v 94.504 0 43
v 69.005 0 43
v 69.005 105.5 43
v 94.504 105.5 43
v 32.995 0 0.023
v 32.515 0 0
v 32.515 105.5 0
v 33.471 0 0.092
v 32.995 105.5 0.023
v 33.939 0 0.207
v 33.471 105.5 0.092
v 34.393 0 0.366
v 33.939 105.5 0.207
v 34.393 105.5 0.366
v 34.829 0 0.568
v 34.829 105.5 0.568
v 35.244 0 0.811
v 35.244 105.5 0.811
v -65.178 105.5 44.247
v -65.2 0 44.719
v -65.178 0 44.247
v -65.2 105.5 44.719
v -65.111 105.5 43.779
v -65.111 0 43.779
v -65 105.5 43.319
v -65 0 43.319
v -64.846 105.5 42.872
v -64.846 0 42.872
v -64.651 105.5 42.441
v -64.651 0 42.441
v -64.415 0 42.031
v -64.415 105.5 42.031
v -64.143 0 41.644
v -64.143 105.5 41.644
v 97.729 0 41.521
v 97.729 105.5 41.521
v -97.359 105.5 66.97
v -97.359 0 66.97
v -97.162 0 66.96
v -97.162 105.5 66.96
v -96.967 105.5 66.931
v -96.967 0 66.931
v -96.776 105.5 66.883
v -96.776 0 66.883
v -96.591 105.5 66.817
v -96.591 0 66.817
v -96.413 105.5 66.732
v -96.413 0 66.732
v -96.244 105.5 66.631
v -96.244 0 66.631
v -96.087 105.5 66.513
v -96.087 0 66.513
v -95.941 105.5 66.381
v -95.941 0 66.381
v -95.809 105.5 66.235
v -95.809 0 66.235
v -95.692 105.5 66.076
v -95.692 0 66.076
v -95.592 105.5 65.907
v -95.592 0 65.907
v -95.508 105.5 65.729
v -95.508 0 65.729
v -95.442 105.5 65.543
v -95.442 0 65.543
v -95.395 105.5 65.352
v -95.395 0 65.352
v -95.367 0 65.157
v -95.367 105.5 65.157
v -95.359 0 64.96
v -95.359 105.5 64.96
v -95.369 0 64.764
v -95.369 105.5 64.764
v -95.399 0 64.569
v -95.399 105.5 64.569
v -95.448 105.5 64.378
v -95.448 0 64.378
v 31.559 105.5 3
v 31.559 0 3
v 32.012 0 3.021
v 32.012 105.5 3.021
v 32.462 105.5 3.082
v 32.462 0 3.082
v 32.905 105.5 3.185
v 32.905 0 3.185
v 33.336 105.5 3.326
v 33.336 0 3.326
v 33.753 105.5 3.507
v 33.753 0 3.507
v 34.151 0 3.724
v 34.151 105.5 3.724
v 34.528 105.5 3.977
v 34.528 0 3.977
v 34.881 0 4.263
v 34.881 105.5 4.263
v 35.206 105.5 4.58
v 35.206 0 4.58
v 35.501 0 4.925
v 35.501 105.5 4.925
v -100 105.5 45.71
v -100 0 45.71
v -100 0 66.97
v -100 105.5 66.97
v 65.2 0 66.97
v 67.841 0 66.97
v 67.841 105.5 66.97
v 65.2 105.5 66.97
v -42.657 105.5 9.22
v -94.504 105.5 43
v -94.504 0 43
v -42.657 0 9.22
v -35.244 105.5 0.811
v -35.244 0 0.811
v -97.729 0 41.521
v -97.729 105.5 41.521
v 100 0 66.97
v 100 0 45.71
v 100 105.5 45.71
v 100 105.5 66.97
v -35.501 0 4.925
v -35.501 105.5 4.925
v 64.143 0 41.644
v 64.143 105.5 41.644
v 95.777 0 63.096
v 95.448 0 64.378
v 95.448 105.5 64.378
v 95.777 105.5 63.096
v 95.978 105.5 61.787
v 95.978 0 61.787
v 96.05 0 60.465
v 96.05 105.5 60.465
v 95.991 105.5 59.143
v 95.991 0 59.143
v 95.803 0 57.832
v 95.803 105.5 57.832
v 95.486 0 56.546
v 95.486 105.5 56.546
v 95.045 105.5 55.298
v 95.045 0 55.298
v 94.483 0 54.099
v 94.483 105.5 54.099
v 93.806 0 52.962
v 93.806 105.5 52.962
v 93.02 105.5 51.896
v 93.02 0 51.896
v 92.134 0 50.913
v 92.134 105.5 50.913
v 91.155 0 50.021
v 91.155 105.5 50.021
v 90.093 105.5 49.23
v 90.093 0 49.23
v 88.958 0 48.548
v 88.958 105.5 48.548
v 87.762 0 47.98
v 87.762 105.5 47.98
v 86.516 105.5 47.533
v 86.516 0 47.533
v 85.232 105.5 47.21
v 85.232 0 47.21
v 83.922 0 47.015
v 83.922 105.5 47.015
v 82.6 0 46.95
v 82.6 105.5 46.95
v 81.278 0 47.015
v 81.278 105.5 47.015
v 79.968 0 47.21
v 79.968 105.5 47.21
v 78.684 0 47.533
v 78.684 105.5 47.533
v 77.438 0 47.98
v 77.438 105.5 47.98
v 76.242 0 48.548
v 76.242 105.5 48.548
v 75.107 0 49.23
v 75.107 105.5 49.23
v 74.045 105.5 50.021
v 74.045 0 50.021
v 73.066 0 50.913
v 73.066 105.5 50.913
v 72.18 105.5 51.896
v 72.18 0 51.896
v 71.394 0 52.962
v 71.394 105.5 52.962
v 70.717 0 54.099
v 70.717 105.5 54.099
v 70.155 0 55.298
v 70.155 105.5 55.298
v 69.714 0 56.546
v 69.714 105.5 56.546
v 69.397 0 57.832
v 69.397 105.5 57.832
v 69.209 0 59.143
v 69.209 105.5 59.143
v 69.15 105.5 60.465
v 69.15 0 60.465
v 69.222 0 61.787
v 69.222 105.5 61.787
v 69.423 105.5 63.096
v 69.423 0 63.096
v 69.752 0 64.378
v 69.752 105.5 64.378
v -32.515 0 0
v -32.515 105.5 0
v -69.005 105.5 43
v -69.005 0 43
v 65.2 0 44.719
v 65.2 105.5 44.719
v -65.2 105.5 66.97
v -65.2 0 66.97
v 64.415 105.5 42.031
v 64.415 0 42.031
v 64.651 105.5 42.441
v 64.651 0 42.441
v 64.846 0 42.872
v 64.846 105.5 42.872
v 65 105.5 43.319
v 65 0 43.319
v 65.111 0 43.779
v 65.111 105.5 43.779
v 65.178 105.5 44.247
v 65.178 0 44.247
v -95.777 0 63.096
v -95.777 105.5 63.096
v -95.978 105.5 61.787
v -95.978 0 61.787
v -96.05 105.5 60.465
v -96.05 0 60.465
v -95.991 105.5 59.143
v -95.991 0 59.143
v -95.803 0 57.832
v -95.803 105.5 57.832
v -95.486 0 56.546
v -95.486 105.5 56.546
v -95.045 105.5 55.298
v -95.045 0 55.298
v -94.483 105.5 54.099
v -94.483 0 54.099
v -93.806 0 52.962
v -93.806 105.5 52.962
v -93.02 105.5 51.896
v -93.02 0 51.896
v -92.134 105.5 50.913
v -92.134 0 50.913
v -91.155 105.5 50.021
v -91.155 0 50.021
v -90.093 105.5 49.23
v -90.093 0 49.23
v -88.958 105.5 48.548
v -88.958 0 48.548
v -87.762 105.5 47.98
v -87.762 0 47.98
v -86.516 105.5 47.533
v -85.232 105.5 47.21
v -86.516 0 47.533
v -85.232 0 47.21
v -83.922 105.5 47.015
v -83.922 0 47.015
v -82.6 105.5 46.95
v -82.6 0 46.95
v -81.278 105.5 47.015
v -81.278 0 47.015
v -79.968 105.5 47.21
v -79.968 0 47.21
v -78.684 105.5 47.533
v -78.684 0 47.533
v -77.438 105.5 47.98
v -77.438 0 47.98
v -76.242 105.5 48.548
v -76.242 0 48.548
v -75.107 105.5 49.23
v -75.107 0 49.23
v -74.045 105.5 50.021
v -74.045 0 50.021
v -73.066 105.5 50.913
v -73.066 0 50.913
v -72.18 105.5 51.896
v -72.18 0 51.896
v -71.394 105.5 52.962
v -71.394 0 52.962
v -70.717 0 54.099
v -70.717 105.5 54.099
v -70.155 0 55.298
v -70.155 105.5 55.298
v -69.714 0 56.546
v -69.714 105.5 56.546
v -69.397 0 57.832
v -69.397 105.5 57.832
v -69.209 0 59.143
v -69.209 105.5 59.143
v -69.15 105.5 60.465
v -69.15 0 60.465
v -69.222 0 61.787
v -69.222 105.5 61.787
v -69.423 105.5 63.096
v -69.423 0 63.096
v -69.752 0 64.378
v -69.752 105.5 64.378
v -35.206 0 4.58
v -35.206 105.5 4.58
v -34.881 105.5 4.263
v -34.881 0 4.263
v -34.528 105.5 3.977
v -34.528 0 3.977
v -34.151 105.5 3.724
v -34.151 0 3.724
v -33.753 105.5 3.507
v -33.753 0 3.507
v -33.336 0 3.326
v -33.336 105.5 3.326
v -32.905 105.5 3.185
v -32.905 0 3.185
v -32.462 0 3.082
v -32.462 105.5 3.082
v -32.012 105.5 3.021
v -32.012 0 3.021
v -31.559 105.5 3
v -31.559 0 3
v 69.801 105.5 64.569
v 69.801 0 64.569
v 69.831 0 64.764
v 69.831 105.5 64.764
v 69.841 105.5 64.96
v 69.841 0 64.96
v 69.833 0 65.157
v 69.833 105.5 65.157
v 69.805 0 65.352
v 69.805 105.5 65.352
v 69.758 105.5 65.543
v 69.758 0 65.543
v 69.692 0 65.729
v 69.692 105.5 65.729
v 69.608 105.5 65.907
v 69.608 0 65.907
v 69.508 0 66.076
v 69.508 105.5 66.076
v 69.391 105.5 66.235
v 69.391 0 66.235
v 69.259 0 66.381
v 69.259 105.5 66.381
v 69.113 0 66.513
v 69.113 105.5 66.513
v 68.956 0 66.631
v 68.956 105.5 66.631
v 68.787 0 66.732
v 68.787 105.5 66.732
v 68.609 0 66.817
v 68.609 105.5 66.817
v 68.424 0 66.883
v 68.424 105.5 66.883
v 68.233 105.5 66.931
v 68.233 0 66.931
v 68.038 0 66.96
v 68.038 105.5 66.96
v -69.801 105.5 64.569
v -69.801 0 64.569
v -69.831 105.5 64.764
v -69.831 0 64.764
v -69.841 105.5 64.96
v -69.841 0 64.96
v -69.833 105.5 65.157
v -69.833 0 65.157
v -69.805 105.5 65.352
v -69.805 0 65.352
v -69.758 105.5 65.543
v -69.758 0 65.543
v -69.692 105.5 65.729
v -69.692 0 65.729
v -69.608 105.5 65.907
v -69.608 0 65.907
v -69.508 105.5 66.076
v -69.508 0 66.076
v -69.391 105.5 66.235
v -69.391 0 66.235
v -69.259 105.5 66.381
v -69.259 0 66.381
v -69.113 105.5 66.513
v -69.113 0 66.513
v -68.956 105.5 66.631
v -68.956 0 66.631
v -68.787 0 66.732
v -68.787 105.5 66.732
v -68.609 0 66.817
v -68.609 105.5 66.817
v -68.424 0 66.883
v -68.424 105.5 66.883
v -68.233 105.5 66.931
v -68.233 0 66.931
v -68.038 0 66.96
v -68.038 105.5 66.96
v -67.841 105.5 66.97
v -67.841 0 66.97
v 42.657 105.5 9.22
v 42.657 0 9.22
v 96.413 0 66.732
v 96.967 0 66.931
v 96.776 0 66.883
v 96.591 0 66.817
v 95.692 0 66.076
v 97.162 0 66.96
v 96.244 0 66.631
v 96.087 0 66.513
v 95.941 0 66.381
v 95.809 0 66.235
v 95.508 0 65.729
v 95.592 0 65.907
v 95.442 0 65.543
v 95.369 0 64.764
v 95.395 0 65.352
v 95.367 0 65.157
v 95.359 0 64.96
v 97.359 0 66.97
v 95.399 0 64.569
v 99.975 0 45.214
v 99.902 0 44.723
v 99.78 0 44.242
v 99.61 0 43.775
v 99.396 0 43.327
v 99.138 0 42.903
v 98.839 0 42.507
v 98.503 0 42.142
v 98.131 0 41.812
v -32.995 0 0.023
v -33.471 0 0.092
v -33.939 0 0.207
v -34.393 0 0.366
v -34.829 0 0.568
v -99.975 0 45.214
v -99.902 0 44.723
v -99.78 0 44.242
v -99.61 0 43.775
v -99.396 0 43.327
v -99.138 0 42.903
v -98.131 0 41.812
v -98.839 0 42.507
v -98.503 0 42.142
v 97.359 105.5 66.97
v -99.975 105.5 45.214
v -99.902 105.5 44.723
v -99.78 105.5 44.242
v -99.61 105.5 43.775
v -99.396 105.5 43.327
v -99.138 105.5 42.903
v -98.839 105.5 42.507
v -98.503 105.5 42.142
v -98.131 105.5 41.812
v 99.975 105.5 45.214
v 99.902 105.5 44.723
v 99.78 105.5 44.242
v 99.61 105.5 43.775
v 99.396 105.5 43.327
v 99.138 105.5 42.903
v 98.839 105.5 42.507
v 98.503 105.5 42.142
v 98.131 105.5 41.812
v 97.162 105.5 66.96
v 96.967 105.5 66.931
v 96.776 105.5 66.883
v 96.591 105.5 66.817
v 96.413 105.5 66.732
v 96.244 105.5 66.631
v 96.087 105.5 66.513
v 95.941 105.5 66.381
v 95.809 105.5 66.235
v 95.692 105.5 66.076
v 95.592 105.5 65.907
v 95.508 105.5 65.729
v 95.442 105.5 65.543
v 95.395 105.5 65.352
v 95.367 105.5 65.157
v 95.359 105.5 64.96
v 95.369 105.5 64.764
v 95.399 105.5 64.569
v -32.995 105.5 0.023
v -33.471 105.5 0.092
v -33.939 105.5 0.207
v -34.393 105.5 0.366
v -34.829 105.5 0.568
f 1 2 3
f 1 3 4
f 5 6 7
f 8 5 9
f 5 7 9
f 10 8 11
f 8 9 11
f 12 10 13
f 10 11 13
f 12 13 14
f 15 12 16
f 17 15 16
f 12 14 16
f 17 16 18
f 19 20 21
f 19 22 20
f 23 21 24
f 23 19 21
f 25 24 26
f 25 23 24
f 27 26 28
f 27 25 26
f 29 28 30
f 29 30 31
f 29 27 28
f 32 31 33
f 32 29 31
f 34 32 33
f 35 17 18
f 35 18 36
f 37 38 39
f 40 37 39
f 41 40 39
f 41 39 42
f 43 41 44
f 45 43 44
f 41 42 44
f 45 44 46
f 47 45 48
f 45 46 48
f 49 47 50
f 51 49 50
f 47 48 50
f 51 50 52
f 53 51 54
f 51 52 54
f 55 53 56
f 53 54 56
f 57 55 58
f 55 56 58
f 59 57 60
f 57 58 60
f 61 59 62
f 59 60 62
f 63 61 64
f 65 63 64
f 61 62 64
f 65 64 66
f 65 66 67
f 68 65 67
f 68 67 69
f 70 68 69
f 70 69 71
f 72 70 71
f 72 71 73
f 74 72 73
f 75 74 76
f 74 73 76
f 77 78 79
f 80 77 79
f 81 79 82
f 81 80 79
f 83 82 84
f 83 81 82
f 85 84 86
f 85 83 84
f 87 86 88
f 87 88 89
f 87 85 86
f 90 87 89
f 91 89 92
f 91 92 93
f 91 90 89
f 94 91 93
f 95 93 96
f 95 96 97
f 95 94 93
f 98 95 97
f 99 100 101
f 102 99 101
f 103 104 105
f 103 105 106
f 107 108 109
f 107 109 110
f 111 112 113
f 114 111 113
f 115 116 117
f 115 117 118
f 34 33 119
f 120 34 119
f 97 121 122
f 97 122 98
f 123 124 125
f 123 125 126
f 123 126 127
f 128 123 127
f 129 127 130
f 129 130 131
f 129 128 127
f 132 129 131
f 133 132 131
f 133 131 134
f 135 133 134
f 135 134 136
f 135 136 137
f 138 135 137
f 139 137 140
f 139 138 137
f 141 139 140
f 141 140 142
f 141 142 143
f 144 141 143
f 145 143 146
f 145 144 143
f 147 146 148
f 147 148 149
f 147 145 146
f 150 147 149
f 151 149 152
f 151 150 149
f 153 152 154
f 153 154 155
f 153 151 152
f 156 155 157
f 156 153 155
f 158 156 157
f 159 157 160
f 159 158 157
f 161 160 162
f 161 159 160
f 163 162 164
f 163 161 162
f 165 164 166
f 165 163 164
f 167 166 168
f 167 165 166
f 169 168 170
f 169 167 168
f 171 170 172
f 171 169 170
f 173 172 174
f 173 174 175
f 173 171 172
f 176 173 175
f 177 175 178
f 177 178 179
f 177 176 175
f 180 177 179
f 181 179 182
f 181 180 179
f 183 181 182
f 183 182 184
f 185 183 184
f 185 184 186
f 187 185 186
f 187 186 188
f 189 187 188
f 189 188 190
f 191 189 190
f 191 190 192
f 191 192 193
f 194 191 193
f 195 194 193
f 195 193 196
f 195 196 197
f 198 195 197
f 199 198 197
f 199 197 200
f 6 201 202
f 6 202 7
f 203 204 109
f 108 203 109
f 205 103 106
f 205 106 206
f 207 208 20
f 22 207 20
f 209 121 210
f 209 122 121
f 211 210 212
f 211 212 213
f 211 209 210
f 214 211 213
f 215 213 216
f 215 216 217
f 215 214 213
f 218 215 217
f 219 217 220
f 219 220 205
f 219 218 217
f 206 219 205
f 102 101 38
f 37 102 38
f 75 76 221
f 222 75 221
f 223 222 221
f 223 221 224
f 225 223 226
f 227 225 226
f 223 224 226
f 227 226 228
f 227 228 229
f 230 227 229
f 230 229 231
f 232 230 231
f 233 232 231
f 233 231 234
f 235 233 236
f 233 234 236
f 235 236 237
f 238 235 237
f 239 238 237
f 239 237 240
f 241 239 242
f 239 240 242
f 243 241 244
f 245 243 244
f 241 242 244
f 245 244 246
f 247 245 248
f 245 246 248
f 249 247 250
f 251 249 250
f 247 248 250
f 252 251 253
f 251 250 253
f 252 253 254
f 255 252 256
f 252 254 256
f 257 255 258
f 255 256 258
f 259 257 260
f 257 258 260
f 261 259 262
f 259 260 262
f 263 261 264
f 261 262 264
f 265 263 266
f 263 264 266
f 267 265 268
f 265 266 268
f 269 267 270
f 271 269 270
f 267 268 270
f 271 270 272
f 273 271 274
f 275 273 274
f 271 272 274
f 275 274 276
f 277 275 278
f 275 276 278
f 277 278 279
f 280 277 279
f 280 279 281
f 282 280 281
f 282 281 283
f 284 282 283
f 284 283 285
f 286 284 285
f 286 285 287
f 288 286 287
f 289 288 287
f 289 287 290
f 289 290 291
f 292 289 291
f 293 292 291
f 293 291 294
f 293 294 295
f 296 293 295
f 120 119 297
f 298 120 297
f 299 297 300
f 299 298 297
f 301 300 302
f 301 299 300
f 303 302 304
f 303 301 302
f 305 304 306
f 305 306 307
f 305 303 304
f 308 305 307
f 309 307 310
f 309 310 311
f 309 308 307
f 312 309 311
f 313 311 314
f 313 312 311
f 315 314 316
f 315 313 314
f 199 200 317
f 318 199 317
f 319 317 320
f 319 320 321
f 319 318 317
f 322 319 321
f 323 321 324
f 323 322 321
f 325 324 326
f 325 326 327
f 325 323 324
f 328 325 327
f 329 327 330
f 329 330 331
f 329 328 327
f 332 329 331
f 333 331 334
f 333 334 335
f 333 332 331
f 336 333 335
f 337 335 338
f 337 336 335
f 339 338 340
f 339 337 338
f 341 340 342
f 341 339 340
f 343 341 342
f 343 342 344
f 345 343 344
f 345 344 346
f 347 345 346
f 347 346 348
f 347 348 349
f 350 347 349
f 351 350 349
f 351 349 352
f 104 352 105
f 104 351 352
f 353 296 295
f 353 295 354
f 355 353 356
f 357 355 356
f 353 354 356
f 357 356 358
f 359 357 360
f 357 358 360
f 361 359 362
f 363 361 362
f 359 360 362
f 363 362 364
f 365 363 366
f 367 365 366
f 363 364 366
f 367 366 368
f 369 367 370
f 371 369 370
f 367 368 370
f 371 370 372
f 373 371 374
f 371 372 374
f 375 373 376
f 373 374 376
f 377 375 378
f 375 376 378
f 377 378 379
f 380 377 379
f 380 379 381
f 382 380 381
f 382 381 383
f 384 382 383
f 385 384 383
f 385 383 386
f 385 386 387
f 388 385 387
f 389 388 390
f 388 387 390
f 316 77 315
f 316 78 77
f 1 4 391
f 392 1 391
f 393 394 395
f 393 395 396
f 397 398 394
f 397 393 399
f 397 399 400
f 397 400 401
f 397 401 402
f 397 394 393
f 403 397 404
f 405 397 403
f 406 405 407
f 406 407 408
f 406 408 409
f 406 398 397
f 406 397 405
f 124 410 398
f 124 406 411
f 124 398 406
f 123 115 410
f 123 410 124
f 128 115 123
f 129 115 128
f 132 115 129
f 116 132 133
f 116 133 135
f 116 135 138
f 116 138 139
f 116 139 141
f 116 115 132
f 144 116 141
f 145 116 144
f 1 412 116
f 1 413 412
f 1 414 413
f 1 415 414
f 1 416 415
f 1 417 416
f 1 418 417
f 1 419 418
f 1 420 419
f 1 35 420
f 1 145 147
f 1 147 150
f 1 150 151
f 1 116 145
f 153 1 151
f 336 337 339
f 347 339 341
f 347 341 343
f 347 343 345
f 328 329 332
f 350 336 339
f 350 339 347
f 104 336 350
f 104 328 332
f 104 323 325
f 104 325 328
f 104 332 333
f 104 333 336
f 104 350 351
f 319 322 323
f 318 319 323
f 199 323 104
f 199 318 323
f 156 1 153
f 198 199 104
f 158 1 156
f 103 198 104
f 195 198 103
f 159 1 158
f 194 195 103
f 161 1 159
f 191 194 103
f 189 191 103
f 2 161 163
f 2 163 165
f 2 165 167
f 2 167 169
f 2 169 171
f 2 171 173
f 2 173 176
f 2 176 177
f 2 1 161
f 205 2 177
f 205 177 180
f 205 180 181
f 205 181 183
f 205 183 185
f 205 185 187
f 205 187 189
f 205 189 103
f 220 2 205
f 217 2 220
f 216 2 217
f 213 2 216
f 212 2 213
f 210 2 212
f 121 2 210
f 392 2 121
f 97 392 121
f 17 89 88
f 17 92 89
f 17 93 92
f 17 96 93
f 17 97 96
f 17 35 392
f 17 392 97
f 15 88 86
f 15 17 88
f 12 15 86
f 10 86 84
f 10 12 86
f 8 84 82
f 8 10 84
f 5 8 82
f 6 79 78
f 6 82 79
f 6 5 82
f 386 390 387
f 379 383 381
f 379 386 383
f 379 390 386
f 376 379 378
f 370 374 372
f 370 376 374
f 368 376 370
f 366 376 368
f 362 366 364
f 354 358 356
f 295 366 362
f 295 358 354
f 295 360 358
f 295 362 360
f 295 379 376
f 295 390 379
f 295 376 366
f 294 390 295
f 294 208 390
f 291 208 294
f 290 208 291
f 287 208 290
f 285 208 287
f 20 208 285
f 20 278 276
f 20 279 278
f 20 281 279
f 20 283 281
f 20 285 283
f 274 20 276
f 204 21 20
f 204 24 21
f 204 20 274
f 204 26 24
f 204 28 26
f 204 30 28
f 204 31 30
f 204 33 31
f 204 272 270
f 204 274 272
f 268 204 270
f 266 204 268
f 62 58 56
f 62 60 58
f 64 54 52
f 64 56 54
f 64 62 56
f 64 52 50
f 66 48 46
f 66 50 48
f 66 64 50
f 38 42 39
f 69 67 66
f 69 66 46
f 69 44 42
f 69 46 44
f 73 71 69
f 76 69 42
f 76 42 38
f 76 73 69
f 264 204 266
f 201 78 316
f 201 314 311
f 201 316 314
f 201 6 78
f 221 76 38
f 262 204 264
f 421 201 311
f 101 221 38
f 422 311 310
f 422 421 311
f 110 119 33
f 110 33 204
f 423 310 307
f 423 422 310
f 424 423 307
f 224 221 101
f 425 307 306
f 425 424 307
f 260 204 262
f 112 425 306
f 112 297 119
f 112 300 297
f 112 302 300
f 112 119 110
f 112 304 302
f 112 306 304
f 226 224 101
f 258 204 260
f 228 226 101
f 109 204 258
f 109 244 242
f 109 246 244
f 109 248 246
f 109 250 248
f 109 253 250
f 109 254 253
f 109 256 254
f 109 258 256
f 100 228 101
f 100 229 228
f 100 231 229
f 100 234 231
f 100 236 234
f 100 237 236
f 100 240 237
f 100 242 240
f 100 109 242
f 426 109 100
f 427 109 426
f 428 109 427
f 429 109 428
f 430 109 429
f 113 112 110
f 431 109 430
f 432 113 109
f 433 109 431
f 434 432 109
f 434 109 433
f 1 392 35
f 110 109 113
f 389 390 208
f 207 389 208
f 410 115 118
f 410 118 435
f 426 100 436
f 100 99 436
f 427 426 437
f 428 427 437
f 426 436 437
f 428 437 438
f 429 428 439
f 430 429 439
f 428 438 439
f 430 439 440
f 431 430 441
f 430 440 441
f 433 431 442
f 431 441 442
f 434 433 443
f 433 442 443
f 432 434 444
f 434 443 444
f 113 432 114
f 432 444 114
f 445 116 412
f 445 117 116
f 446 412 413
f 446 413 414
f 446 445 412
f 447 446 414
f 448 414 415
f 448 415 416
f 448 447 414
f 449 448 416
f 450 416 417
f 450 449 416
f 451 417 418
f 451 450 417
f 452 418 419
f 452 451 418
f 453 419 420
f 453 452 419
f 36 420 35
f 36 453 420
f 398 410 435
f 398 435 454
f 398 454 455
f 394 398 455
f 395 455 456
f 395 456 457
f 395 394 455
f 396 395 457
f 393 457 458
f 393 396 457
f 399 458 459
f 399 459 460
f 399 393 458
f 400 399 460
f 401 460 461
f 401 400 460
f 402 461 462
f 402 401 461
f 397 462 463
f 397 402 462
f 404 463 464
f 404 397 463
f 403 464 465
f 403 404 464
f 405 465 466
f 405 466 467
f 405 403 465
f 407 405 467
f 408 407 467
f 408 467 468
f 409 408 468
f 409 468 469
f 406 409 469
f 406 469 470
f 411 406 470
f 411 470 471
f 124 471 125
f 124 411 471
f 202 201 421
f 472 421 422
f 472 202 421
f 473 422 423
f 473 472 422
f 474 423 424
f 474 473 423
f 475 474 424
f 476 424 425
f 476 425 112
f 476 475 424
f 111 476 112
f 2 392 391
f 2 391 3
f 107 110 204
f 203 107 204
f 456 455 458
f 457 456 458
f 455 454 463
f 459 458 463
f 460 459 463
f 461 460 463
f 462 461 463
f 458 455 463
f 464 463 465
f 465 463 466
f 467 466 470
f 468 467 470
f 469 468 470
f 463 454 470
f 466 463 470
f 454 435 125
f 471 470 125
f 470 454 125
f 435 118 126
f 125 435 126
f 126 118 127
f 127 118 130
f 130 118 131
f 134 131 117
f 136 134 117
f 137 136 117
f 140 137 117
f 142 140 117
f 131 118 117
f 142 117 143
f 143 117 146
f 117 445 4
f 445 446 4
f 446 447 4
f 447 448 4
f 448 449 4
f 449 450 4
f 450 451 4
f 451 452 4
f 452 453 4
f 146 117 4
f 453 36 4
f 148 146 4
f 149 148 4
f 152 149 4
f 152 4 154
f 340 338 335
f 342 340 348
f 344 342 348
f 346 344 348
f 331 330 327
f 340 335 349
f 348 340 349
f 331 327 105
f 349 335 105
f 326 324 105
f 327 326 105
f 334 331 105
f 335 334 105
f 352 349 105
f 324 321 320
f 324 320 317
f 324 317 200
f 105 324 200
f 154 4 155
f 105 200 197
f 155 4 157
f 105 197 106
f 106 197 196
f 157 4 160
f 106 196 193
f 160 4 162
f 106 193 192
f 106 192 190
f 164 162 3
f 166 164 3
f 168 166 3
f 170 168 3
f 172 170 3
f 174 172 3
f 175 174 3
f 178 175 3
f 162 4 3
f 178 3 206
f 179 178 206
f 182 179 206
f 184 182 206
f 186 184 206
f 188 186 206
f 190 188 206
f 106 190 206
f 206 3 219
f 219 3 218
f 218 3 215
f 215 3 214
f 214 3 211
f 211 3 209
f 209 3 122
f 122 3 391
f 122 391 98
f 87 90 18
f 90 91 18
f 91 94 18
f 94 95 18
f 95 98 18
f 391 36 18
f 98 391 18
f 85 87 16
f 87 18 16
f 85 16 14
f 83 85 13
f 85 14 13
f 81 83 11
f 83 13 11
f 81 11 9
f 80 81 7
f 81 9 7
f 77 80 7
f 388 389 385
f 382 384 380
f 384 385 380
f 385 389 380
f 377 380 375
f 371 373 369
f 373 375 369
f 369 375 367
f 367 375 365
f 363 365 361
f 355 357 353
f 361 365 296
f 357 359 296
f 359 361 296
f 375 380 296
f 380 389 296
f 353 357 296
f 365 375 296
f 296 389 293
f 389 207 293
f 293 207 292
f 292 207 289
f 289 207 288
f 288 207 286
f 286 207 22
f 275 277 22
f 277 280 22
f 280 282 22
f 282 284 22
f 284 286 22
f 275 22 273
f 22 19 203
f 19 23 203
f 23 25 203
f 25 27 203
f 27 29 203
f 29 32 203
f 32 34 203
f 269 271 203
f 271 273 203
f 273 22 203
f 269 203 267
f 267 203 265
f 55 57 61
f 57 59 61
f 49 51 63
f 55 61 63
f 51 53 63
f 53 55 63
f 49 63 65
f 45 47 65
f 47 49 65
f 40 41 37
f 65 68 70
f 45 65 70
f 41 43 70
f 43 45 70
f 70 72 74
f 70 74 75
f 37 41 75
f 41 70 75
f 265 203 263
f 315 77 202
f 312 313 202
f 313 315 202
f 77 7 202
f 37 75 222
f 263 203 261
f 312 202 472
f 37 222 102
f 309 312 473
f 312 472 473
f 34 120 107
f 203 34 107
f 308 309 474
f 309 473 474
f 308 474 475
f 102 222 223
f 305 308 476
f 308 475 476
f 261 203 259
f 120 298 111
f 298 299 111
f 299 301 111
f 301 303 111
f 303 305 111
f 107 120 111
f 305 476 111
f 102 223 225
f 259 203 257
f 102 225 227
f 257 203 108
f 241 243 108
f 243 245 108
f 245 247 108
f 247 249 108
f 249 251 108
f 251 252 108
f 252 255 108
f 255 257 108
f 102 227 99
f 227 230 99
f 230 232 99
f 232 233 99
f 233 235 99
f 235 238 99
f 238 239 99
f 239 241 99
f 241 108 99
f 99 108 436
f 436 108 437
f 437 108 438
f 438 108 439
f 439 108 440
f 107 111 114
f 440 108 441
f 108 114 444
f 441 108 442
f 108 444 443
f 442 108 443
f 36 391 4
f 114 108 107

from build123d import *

# Parameters (mm, degrees)
BOSS_EXTRUDE1_DEPTH = 105.5
FILLET1_R           = 5


with BuildPart() as part:
    # Sketch1 → Boss-Extrude1 (new body)
    with BuildSketch(Plane(origin=(0, 0, 0), x_dir=(1, 0, 0), z_dir=(0, 1, 0))):
        with BuildLine():
            Line((0, 0), (-34, 0))
            Line((-34, 0), (-100, -43))
            Line((-100, -43), (-100, -66.97))
            Line((-100, -66.97), (-97.358644924, -66.97))
            ThreePointArc((-97.358644924, -66.97), (-95.748804634, -66.156766295), (-95.448140727, -64.378414239))
            ThreePointArc((-95.448140727, -64.378414239), (-82.6, -46.95), (-69.751859273, -64.378414239))
            ThreePointArc((-69.751859273, -64.378414239), (-69.451195366, -66.156766295), (-67.841355076, -66.97))
            Line((-67.841355076, -66.97), (-65.2, -66.97))
            Line((-65.2, -66.97), (-65.2, -43))
            Line((-65.2, -43), (-34, -3))
            Line((-34, -3), (0, -3))
            Line((0, -3), (0, 0))
        make_face()
        Polygon((-69.004681327, -43), (-94.504291462, -43), (-42.656655328, -9.220479488), align=None, mode=Mode.SUBTRACT)
    boss_extrude1 = extrude(amount=BOSS_EXTRUDE1_DEPTH)

    # Mirror1: Boss-Extrude1 across plane
    add(boss_extrude1.mirror(Plane(origin=(0, 105.5, 3), x_dir=(0, 0, 1), z_dir=(-1, 0, 0))))

    # Fillet1
    fillet1_edges = [part.edges().sort_by_distance(p)[0] for p in [
        (-34, 52.75, 3),
        (-65.2, 52.75, 43),
        (-100, 52.75, 43),
        (-34, 52.75, 0),
        (34, 52.75, 3),
        (65.2, 52.75, 43),
        (100, 52.75, 43),
        (34, 52.75, 0),
    ]]
    fillet(fillet1_edges, radius=FILLET1_R)


solid = part.part
